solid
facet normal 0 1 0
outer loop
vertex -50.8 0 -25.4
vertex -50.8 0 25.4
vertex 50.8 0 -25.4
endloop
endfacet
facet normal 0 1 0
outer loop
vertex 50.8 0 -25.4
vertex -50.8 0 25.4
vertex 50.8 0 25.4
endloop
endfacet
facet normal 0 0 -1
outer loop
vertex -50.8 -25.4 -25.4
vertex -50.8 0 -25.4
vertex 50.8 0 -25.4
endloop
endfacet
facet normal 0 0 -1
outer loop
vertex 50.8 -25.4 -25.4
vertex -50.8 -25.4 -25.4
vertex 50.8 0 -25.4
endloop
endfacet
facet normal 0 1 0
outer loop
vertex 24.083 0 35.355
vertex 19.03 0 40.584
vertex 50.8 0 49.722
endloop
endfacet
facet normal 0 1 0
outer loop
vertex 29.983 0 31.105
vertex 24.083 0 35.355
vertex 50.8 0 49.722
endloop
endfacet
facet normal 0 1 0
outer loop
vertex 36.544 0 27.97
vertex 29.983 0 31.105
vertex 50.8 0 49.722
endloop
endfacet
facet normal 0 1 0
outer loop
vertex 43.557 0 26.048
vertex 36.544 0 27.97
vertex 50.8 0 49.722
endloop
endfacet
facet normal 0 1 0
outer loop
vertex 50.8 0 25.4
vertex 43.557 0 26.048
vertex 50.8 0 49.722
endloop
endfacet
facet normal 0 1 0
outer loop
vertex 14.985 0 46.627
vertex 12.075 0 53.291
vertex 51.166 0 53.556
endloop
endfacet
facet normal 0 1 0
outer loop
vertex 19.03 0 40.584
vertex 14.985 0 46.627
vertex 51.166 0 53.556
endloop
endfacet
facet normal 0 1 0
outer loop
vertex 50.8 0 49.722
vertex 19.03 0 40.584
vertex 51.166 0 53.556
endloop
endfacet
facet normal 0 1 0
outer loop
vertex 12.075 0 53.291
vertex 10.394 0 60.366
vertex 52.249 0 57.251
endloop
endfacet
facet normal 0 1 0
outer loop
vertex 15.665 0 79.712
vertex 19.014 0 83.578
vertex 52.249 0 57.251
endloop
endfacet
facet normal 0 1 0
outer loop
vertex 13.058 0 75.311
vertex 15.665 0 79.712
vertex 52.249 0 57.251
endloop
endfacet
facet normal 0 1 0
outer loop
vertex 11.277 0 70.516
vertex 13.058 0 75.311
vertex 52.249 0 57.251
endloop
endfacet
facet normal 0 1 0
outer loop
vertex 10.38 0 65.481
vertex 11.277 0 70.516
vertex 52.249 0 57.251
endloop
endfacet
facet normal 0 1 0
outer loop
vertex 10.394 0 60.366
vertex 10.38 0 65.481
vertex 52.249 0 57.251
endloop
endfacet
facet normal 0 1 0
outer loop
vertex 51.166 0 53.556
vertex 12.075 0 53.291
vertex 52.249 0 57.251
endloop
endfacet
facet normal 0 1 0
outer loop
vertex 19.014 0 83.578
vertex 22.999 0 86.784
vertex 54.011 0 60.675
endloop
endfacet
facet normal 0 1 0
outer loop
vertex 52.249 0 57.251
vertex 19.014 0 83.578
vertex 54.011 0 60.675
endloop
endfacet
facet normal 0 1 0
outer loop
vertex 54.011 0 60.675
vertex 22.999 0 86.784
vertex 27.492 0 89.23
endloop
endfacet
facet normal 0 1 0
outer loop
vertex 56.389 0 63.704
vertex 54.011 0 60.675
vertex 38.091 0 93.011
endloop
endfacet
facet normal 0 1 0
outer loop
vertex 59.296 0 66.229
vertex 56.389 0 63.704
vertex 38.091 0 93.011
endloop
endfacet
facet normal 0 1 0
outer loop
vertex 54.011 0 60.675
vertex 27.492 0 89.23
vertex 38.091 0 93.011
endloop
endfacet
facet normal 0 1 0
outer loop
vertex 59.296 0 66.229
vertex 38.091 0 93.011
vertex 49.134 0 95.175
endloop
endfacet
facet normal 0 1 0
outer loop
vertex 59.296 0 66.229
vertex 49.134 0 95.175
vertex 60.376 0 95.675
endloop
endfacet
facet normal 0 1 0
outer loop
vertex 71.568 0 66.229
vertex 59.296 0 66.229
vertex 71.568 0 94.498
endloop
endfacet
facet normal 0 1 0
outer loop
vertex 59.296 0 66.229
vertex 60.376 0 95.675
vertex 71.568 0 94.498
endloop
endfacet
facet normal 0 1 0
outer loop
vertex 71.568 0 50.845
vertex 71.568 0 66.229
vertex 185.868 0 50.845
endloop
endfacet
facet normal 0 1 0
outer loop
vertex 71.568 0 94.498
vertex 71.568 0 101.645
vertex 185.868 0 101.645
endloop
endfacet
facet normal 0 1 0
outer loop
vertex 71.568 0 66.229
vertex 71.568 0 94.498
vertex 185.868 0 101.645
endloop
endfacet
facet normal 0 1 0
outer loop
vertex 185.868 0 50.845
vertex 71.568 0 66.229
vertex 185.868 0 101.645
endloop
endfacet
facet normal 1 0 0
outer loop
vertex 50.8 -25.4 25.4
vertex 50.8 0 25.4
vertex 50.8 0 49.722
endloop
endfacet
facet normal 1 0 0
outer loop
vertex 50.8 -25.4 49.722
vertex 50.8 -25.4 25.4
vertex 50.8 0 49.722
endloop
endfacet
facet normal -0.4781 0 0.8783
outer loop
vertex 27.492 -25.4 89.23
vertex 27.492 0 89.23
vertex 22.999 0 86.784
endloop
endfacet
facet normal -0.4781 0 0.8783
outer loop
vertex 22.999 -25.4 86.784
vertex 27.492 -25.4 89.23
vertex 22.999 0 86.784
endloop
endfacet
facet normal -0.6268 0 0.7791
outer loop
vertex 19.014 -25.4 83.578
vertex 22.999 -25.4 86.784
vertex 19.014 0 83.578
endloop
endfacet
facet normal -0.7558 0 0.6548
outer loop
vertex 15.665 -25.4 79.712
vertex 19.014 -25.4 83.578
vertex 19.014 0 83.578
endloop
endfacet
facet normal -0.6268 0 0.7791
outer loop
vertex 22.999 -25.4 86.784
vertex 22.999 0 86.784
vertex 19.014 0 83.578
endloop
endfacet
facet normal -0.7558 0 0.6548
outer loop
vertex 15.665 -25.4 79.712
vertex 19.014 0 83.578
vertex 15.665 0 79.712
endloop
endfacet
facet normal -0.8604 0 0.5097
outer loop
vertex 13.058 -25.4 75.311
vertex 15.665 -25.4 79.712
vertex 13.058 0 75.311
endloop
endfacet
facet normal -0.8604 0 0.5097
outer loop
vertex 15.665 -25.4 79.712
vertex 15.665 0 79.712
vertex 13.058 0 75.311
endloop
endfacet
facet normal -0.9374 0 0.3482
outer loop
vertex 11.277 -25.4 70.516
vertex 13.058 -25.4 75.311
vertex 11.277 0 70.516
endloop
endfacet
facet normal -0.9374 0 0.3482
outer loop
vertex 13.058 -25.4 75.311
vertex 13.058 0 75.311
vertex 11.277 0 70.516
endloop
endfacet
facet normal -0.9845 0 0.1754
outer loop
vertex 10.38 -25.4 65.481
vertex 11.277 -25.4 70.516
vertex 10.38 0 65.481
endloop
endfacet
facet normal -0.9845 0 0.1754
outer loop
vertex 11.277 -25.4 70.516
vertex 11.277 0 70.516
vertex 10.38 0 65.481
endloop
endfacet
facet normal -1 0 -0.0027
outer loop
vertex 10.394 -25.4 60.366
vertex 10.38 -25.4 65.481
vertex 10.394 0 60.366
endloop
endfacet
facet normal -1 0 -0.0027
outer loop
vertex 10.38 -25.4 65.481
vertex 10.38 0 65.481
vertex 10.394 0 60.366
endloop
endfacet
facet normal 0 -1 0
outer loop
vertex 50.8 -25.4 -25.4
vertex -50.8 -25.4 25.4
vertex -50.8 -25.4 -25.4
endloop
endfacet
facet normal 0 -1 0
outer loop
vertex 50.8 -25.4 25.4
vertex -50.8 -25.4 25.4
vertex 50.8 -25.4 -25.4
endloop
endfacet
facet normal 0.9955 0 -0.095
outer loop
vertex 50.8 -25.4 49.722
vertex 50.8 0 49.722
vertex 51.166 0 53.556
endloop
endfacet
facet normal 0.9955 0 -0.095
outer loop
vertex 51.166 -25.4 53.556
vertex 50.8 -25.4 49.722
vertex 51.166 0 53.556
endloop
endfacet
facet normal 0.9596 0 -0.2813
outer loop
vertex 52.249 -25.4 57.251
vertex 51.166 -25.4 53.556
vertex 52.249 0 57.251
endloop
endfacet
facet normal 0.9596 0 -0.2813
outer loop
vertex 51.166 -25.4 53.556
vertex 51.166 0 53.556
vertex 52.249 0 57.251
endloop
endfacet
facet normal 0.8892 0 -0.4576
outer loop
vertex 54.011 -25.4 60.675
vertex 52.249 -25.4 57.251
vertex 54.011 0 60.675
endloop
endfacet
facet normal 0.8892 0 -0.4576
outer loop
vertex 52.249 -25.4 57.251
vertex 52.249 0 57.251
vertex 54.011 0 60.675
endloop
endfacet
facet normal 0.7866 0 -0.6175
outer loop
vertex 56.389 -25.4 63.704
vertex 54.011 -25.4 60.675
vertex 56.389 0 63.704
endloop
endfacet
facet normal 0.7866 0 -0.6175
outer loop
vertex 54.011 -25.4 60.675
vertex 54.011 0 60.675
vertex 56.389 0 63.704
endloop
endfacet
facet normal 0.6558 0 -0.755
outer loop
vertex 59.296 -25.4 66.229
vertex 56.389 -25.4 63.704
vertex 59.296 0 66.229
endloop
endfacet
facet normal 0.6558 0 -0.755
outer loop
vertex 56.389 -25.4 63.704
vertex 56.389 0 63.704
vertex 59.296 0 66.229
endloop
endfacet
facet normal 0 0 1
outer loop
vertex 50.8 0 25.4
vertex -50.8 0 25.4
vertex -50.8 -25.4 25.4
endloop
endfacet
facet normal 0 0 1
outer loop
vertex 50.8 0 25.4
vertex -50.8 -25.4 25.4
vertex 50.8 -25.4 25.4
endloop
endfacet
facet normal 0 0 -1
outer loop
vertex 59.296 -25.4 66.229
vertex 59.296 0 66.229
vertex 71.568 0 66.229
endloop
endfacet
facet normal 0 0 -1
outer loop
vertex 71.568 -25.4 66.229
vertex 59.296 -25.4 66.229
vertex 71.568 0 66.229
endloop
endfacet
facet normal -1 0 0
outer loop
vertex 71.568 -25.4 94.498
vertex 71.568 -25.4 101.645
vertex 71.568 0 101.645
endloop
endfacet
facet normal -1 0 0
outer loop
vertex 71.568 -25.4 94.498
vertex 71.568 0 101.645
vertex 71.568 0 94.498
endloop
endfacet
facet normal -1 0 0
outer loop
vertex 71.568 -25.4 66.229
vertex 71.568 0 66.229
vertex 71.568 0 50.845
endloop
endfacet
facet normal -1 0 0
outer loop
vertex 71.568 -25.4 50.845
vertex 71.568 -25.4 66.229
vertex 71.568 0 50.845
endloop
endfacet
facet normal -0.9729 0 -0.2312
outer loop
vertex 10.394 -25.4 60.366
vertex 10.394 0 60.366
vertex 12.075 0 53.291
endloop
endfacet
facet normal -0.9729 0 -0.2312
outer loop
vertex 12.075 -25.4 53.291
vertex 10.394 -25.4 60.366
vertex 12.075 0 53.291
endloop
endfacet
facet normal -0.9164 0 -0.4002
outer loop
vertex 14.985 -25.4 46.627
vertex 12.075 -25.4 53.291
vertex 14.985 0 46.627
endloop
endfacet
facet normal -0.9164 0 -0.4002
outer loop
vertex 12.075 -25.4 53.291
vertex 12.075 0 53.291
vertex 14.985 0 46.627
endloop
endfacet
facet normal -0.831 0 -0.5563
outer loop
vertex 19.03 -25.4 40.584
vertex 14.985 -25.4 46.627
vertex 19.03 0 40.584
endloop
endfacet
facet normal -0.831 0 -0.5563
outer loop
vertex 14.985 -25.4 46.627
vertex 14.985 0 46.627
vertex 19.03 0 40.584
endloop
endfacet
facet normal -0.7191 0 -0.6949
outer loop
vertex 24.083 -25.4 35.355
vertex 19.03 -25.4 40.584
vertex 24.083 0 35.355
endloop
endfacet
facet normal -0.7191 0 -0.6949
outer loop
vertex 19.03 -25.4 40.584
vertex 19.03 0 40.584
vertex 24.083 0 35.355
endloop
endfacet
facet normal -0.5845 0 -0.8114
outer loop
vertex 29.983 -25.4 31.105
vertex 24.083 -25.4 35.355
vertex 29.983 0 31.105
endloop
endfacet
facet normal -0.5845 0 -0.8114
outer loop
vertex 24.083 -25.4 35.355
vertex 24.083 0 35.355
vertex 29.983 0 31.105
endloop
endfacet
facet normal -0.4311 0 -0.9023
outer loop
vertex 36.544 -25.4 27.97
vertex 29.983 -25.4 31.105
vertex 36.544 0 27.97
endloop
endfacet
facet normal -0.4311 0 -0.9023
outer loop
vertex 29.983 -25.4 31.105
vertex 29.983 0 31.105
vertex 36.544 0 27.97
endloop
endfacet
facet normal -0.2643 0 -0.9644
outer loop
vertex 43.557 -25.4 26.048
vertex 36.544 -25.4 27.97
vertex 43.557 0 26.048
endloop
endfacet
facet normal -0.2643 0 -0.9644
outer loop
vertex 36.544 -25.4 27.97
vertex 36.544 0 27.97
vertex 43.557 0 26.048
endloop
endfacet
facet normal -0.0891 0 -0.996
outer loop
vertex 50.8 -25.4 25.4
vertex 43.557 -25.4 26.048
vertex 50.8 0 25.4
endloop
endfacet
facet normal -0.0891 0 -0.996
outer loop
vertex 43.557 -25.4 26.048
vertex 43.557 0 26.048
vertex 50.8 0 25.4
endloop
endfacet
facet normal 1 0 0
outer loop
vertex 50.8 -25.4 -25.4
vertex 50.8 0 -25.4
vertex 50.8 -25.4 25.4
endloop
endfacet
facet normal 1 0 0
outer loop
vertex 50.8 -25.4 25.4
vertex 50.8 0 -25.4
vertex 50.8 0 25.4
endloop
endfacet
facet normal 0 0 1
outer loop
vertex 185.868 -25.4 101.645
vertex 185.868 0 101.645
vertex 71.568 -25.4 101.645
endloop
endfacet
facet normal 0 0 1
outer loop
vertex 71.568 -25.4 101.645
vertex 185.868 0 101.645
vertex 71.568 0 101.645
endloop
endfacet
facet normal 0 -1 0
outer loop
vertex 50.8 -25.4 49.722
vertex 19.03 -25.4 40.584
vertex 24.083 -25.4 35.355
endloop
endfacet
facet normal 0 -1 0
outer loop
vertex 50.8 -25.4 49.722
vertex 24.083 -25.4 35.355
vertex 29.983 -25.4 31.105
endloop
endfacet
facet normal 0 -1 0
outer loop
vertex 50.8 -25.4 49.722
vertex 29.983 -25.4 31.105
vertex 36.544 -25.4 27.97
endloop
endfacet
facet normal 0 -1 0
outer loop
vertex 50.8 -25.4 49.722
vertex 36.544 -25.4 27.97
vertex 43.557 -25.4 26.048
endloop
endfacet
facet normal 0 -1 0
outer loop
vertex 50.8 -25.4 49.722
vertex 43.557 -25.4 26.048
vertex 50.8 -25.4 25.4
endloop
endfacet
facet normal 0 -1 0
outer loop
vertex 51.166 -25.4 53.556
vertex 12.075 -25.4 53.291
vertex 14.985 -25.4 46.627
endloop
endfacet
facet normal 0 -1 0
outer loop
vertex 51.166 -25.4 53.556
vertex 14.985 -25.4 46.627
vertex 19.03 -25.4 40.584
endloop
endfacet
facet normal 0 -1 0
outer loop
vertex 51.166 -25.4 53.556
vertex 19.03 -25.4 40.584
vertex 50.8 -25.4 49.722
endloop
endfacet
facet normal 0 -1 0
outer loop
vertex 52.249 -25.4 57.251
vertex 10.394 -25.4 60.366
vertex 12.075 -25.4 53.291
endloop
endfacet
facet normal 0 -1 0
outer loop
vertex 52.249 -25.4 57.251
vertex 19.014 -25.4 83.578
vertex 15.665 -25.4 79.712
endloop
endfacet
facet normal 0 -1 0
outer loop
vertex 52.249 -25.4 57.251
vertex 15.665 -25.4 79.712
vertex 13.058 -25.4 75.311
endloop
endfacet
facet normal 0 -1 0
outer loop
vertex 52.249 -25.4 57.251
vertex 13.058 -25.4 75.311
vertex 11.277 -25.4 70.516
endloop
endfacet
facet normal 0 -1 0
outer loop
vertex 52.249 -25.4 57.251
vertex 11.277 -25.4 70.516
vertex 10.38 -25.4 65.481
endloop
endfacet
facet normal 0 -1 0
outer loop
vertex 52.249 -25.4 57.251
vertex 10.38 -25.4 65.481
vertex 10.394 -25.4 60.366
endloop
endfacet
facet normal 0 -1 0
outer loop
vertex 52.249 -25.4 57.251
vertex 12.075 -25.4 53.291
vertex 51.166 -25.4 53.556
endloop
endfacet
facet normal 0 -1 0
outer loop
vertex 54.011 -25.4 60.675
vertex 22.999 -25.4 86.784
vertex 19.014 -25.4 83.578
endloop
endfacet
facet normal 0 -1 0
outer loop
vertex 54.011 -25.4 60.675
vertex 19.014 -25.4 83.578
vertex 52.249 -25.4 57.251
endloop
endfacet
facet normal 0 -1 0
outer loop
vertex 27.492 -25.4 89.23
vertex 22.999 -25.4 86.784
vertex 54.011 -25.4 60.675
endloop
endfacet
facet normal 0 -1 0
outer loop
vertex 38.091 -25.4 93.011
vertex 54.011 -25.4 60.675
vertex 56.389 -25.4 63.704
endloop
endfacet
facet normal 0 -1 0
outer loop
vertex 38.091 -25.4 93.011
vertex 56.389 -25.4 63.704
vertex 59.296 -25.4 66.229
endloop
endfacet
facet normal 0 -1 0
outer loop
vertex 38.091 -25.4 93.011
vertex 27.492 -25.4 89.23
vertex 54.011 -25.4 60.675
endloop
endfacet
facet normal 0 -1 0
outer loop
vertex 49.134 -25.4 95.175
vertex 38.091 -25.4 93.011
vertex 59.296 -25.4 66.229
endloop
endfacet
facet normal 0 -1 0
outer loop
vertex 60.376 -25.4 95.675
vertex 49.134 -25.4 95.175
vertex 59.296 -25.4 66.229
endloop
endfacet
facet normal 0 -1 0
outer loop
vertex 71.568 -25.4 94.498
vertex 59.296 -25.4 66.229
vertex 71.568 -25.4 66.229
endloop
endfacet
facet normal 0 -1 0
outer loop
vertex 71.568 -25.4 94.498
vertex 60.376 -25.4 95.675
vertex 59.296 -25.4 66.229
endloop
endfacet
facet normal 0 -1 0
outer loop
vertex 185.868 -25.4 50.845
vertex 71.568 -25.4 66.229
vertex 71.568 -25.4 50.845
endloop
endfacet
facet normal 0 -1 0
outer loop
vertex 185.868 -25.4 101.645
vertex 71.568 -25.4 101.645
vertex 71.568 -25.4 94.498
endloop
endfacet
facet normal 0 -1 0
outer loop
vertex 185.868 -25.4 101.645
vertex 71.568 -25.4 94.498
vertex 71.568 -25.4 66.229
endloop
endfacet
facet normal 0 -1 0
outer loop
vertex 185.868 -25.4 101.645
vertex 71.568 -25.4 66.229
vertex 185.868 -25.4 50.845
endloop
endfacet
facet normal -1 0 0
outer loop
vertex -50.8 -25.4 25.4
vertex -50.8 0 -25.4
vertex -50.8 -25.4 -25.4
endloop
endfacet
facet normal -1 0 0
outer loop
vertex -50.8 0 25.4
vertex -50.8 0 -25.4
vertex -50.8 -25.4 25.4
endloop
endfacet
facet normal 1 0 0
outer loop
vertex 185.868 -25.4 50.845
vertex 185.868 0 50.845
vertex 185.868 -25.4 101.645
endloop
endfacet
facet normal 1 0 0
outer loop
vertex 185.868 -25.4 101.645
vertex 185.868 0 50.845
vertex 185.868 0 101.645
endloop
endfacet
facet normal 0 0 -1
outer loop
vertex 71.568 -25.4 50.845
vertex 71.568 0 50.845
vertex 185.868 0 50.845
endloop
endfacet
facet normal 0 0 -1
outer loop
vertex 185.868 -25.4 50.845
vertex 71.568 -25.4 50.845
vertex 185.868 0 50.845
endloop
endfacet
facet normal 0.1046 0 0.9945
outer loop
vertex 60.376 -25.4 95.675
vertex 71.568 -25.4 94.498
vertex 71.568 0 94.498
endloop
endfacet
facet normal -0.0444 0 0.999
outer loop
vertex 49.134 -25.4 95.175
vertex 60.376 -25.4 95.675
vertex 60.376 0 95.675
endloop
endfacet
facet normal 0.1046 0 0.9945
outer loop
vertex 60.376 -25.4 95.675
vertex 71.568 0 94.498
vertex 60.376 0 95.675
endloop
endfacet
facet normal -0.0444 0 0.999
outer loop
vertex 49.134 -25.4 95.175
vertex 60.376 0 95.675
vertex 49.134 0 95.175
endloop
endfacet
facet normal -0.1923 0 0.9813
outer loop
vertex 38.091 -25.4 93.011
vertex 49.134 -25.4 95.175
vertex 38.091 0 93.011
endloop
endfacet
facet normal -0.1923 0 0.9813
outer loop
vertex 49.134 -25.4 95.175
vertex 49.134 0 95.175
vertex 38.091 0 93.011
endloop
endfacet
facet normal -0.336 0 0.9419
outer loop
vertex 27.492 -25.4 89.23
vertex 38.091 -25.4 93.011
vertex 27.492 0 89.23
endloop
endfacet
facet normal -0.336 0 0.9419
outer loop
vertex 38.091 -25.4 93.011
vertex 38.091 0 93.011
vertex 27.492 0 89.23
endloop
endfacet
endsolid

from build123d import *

# Parameters (mm, degrees)
F1_DEPTH = 25.4
F0_W     = 101.6
F0_H     = 50.8


with BuildPart() as f1:
    # F0 (on Front) → F1 (new body)
    with BuildSketch(Plane.XZ):
        with BuildLine():
            ThreePointArc((10.3944045648, 60.3657866119), (24.082878262, 35.3551021018), (50.8, 25.4))
            Line((50.8, 25.4), (50.8, 38.0313412011))
            Line((50.8, 38.0313412011), (50.8, 49.7220940888))
            ThreePointArc((50.8, 49.7220940888), (53.0487528423, 59.0045752006), (59.2963695526, 66.2287450752))
            Line((59.2963695526, 66.2287450752), (71.5682441892, 66.2287450752))
            Line((71.5682441892, 66.2287450752), (71.5682441892, 94.4982363395))
            ThreePointArc((71.5682441892, 94.4982363395), (49.1341654269, 95.1751720147), (27.4917148054, 89.2295464873))
            ThreePointArc((27.4917148054, 89.2295464873), (14.2628571936, 77.5699621317), (10.3944045648, 60.3657866119))
        make_face()
        with BuildLine():
            ThreePointArc((117.9655272715, 66.2287450752), (97.3968675917, 84.6799466274), (71.5682441892, 94.4982363395))
            Line((71.5682441892, 94.4982363395), (71.5682441892, 66.2287450752))
            Line((71.5682441892, 66.2287450752), (117.9655272715, 66.2287450752))
        make_face()
        with BuildLine():
            Line((71.5682441892, 101.6453287184), (71.5682441892, 94.4982363395))
            ThreePointArc((71.5682441892, 94.4982363395), (97.3968675917, 84.6799466274), (117.9655272715, 66.2287450752))
            Line((117.9655272715, 66.2287450752), (71.5682441892, 66.2287450752))
            Line((71.5682441892, 66.2287450752), (71.5682441892, 50.8453287184))
            Line((71.5682441892, 50.8453287184), (185.8682441892, 50.8453287184))
            Line((185.8682441892, 50.8453287184), (185.8682441892, 101.6453287184))
            Line((185.8682441892, 101.6453287184), (71.5682441892, 101.6453287184))
        make_face()
    extrude(amount=F1_DEPTH)


with BuildPart() as f1b:
    # F0 (on Front) → F1, piece 2 (new body)
    with BuildSketch(Plane.XZ):
        Rectangle(F0_W, F0_H)
    extrude(amount=F1_DEPTH)


solid = Compound([f1.part, f1b.part])
